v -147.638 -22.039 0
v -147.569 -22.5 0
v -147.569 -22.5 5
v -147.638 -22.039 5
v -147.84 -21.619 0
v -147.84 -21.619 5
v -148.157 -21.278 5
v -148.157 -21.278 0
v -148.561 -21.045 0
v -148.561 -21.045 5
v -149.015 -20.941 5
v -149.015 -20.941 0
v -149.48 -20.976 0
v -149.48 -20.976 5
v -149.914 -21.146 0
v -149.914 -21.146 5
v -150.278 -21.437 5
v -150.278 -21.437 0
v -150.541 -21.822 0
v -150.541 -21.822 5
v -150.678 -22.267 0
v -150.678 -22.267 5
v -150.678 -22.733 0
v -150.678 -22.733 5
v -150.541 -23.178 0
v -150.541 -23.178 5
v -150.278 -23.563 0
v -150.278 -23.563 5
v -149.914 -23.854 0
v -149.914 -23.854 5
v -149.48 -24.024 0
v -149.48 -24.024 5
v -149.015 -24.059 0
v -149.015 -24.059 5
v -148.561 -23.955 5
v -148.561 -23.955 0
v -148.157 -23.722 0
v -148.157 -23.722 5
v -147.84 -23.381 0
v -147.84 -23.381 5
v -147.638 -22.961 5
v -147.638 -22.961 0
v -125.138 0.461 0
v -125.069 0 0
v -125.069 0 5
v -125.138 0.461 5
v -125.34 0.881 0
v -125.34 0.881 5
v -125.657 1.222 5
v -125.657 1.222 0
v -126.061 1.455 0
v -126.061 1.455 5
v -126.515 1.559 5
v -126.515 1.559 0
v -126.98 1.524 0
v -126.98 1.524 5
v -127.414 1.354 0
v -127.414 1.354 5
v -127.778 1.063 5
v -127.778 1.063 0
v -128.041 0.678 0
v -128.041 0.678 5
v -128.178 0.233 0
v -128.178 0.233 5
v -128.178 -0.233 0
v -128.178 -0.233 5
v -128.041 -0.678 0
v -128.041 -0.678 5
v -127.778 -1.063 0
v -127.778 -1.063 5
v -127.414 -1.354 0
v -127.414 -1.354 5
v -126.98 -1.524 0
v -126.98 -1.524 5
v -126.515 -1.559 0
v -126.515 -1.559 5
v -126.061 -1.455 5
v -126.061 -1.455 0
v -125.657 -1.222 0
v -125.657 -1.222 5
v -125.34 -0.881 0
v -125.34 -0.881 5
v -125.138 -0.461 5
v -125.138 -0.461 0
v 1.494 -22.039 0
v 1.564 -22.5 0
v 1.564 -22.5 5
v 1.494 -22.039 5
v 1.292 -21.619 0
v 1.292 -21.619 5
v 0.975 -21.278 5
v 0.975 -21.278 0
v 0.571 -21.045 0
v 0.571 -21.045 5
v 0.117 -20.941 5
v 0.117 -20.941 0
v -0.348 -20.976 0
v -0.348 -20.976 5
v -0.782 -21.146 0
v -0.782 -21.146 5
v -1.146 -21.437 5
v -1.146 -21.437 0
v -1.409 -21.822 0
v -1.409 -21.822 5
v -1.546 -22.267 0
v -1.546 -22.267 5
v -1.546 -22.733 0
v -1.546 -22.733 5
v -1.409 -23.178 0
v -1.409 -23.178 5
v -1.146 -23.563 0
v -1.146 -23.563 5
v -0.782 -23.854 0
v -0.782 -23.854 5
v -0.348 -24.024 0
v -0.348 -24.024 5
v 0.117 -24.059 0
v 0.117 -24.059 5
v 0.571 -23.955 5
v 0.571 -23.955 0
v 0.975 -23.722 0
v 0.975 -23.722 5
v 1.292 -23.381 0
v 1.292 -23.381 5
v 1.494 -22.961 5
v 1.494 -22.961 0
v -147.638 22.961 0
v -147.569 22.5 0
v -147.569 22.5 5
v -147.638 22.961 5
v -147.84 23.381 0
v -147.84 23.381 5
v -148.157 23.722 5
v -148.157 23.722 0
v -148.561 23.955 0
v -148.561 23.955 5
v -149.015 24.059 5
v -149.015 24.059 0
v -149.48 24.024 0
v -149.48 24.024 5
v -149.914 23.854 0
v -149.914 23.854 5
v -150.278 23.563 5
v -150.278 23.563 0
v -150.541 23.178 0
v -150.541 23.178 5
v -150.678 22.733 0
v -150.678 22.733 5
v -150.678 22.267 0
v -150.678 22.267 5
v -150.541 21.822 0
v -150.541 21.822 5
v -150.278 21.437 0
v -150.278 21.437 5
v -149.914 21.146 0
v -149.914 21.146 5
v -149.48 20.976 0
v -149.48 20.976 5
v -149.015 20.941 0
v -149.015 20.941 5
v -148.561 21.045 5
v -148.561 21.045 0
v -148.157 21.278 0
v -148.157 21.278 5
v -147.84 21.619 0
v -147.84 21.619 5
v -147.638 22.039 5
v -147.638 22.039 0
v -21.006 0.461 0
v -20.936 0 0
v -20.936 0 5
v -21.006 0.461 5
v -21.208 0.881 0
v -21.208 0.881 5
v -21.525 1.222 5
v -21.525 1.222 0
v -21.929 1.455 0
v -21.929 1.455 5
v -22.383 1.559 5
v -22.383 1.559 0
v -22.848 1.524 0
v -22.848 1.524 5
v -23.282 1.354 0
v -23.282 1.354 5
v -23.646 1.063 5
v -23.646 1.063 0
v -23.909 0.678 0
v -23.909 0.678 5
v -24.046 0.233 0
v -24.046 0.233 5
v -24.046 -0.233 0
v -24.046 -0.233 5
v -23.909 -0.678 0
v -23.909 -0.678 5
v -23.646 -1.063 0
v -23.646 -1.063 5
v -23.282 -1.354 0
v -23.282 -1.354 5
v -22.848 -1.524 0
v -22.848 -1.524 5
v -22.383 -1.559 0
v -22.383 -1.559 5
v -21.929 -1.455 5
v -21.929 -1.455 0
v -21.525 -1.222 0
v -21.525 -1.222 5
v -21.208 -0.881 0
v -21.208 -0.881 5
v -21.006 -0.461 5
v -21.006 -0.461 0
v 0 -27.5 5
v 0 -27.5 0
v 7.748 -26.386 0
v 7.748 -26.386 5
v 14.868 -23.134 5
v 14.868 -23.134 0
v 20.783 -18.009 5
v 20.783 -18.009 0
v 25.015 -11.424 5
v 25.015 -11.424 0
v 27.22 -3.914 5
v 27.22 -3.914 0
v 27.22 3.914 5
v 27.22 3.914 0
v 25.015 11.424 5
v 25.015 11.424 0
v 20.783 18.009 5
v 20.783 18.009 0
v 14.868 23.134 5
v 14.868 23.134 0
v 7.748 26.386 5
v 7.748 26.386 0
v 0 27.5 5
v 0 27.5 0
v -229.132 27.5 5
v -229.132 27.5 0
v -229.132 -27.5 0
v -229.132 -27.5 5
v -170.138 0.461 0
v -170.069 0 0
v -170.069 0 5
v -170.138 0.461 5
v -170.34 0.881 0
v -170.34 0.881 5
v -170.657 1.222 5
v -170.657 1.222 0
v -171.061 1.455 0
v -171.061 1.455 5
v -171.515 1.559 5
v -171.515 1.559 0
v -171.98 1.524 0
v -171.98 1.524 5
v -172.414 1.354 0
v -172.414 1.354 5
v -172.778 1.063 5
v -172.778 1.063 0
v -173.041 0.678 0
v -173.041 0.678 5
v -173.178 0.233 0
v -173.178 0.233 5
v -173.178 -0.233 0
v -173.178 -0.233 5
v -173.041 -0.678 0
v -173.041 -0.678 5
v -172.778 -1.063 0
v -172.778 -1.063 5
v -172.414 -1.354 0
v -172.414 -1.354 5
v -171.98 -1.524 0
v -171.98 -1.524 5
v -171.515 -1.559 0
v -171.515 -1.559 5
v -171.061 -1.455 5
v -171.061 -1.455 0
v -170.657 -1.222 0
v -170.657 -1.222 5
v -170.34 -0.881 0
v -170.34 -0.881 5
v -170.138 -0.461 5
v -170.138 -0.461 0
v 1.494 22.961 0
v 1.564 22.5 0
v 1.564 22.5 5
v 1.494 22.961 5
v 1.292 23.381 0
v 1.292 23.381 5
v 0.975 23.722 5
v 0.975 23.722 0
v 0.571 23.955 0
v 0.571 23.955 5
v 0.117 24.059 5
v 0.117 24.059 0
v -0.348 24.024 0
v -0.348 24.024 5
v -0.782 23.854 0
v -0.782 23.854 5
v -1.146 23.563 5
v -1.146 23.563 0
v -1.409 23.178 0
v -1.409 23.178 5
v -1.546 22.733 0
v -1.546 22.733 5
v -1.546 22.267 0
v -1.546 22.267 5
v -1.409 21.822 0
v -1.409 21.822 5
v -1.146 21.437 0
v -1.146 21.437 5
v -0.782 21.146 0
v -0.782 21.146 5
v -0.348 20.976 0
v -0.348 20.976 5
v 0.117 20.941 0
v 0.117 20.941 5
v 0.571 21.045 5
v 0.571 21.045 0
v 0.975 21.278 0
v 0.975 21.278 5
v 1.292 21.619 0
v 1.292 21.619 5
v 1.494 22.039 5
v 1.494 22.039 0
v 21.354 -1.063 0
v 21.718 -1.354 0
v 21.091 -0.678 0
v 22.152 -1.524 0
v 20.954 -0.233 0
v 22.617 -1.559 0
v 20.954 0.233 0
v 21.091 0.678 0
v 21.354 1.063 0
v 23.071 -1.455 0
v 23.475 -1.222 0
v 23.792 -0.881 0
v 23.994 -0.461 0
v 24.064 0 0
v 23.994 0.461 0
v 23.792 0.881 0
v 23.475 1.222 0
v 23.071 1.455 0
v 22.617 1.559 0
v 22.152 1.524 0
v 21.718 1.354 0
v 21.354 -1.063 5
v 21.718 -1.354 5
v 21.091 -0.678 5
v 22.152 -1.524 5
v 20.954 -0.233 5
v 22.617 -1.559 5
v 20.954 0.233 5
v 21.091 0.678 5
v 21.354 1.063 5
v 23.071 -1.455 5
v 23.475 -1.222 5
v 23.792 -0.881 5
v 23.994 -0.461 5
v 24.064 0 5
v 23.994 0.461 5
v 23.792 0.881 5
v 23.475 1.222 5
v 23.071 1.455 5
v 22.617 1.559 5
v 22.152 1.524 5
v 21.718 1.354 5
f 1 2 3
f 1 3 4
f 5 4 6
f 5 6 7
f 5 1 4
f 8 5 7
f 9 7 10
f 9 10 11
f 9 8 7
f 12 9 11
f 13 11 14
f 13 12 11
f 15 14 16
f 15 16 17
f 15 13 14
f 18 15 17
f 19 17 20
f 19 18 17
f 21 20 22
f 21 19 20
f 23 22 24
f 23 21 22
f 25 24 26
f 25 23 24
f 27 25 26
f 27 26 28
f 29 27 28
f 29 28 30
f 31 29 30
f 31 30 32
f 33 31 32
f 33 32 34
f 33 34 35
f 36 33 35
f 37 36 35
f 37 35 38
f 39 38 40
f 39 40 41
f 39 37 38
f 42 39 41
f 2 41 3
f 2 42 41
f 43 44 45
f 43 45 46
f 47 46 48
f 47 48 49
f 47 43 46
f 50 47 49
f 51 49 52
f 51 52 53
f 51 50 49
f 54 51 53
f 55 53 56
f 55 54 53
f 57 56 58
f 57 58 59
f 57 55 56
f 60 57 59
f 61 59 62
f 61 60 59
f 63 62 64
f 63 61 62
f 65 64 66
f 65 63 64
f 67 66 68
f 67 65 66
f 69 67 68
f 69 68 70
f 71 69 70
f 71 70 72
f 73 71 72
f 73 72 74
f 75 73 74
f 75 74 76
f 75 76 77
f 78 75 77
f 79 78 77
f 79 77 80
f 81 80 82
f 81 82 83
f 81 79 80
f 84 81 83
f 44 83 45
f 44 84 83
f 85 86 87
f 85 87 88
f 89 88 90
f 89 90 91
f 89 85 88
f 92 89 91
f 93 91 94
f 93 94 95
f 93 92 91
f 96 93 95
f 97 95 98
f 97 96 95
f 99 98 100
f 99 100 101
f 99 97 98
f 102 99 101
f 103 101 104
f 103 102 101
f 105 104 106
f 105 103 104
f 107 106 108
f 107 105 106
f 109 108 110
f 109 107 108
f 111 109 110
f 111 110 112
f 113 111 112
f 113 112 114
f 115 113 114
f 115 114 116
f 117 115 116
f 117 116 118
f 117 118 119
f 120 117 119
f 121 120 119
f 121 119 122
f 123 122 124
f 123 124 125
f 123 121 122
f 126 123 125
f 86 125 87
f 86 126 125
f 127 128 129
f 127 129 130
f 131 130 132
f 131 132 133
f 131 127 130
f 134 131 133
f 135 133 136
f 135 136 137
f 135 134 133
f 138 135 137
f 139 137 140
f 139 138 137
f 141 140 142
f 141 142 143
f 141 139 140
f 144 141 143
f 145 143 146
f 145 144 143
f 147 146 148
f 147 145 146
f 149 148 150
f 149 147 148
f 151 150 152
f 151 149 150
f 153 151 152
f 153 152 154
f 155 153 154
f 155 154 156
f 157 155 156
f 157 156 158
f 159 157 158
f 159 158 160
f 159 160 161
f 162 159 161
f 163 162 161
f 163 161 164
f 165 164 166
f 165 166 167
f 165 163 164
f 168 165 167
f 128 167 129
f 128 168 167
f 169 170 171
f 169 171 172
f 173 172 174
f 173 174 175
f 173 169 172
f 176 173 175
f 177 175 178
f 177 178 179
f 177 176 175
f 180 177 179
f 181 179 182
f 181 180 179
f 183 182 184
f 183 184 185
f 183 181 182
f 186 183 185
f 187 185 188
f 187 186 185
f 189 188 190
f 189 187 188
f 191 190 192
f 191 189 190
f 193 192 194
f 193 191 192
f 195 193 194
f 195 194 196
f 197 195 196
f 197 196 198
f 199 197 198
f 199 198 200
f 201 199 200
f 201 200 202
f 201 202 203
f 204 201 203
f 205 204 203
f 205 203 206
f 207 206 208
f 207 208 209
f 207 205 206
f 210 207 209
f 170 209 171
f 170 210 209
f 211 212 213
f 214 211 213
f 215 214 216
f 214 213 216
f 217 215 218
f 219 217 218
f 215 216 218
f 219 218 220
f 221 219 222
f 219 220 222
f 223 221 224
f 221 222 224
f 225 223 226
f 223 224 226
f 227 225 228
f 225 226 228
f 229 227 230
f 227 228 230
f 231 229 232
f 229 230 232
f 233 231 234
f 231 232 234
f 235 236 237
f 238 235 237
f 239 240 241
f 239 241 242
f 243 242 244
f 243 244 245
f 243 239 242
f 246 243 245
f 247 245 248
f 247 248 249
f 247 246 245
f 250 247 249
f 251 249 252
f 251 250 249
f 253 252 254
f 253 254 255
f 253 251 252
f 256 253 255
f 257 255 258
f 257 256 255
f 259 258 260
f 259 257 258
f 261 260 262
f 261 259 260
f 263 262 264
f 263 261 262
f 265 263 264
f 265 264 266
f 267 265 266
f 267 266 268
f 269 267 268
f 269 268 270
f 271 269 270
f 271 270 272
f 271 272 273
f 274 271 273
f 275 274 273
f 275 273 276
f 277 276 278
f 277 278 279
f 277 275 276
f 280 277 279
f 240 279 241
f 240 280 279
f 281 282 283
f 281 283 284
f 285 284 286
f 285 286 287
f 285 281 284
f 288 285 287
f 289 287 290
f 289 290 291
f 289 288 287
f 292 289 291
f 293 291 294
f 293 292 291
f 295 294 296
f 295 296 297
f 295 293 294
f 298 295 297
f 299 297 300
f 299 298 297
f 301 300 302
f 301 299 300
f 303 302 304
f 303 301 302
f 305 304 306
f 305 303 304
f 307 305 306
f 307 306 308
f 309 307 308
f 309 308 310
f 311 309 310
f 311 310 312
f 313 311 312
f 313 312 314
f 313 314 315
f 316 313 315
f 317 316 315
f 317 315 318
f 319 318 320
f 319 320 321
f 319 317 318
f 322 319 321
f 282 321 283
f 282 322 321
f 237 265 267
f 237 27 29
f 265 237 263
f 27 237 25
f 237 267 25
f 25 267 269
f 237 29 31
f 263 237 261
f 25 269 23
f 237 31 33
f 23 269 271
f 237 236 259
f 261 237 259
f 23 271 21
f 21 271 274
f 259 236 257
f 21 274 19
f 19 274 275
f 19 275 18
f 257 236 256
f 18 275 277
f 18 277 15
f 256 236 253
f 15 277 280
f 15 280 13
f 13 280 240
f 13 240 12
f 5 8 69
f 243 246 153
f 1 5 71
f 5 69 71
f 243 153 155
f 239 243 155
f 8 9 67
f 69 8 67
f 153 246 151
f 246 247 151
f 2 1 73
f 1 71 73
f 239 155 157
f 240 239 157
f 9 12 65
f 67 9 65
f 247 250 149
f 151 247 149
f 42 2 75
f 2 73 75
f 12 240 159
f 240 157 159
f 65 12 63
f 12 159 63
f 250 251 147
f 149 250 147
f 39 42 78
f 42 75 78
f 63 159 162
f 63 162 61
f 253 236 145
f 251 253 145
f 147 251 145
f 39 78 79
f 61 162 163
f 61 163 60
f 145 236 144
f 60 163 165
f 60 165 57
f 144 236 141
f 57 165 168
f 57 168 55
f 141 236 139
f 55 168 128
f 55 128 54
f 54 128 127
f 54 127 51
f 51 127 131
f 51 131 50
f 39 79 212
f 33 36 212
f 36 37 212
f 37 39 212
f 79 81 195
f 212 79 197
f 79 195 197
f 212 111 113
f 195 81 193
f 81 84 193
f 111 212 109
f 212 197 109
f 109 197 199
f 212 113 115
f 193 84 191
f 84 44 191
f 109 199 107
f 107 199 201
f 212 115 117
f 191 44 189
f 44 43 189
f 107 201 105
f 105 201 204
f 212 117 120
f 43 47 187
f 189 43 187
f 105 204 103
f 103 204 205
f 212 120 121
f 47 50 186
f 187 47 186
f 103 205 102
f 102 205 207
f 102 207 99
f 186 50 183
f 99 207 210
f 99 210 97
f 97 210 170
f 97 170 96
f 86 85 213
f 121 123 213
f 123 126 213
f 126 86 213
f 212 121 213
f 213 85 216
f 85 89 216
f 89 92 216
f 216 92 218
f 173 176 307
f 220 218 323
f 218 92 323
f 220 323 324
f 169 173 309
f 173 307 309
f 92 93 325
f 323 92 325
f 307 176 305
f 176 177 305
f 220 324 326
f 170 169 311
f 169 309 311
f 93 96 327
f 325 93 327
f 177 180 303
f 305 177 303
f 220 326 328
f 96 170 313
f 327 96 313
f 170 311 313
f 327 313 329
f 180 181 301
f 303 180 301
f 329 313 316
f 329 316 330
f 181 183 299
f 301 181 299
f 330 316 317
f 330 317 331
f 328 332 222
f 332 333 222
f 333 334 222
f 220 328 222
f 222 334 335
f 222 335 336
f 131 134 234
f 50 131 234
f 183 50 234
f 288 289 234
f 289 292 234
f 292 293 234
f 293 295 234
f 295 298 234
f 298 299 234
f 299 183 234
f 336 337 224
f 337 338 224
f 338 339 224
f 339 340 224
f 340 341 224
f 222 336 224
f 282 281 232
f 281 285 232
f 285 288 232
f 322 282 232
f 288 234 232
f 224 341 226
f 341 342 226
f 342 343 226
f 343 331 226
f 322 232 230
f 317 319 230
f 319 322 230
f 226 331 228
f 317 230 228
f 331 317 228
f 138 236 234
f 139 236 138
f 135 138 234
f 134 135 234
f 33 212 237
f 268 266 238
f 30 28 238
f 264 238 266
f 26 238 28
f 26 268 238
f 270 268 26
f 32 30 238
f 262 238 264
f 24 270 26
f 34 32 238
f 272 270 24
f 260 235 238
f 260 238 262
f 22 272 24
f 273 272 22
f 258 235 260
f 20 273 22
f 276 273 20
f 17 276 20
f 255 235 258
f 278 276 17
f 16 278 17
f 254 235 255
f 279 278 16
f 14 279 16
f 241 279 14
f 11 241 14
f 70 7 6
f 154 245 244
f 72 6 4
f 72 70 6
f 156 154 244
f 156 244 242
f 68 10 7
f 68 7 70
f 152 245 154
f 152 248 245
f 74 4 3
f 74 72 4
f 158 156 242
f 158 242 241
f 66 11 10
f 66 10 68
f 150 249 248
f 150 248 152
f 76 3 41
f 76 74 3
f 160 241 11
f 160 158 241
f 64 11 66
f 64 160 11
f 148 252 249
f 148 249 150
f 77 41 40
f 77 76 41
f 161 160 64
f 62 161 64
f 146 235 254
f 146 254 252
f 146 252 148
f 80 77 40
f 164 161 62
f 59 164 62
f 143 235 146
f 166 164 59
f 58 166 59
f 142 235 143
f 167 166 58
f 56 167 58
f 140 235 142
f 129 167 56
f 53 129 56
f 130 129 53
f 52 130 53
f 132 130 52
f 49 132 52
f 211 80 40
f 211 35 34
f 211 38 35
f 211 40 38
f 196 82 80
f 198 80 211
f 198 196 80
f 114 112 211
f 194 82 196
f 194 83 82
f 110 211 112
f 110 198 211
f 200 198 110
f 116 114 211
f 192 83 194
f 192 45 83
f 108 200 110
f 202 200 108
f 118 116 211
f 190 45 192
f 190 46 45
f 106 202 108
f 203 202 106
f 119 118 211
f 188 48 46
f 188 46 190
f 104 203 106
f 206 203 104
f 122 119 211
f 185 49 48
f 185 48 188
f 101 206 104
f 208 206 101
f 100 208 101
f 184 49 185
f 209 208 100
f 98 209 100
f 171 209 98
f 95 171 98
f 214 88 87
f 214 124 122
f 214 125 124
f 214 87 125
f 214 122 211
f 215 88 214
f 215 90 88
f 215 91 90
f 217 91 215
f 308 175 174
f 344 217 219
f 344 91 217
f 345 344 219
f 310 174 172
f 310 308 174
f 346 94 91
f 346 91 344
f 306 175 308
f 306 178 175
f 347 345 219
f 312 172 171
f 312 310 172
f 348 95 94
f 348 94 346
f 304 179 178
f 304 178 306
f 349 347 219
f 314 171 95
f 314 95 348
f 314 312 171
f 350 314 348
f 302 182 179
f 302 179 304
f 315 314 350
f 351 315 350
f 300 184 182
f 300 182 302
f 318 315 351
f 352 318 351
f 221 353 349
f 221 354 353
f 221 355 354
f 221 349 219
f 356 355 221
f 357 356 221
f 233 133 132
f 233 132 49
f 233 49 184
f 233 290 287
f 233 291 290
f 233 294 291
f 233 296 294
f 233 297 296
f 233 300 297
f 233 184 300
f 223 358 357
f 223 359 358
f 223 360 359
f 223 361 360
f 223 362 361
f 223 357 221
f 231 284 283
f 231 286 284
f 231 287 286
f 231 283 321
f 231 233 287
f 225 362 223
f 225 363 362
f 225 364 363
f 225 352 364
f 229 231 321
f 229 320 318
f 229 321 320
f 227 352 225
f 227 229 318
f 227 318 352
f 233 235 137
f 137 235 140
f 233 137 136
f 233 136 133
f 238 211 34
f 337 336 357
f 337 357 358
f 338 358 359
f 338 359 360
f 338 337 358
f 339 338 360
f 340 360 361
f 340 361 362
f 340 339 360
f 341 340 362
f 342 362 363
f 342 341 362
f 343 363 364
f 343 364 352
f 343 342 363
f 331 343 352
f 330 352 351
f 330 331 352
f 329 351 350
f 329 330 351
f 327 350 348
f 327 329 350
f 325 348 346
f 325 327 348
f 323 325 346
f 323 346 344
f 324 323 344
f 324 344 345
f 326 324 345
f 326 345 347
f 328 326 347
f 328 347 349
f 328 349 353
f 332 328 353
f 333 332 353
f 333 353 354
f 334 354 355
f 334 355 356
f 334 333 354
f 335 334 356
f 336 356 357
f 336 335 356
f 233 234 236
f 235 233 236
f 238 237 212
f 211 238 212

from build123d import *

# Parameters (mm, degrees)
SKETCH2_R           = 1.5635
BOSS_EXTRUDE1_DEPTH = 5


with BuildPart() as part:
    # Sketch2 → Boss-Extrude1 (new body)
    with BuildSketch(Plane.XY):
        with BuildLine():
            Line((0, 27.5), (-229.132053392, 27.5))
            Line((-229.132053392, 27.5), (-229.132053392, -27.5))
            Line((-229.132053392, -27.5), (0, -27.5))
            ThreePointArc((0, -27.5), (27.5, 0), (0, 27.5))
        make_face()
        with Locations((0, 22.5)):
            Circle(SKETCH2_R, mode=Mode.SUBTRACT)
        with Locations((22.5, 0)):
            Circle(SKETCH2_R, mode=Mode.SUBTRACT)
        with Locations((0, -22.5)):
            Circle(SKETCH2_R, mode=Mode.SUBTRACT)
        with Locations((-22.5, 0)):
            Circle(SKETCH2_R, mode=Mode.SUBTRACT)
        with Locations((-171.632053392, 0)):
            Circle(SKETCH2_R, mode=Mode.SUBTRACT)
        with Locations((-149.132053392, 22.5)):
            Circle(SKETCH2_R, mode=Mode.SUBTRACT)
        with Locations((-126.632053392, 0)):
            Circle(SKETCH2_R, mode=Mode.SUBTRACT)
        with Locations((-149.132053392, -22.5)):
            Circle(SKETCH2_R, mode=Mode.SUBTRACT)
    extrude(amount=BOSS_EXTRUDE1_DEPTH)


solid = part.part
